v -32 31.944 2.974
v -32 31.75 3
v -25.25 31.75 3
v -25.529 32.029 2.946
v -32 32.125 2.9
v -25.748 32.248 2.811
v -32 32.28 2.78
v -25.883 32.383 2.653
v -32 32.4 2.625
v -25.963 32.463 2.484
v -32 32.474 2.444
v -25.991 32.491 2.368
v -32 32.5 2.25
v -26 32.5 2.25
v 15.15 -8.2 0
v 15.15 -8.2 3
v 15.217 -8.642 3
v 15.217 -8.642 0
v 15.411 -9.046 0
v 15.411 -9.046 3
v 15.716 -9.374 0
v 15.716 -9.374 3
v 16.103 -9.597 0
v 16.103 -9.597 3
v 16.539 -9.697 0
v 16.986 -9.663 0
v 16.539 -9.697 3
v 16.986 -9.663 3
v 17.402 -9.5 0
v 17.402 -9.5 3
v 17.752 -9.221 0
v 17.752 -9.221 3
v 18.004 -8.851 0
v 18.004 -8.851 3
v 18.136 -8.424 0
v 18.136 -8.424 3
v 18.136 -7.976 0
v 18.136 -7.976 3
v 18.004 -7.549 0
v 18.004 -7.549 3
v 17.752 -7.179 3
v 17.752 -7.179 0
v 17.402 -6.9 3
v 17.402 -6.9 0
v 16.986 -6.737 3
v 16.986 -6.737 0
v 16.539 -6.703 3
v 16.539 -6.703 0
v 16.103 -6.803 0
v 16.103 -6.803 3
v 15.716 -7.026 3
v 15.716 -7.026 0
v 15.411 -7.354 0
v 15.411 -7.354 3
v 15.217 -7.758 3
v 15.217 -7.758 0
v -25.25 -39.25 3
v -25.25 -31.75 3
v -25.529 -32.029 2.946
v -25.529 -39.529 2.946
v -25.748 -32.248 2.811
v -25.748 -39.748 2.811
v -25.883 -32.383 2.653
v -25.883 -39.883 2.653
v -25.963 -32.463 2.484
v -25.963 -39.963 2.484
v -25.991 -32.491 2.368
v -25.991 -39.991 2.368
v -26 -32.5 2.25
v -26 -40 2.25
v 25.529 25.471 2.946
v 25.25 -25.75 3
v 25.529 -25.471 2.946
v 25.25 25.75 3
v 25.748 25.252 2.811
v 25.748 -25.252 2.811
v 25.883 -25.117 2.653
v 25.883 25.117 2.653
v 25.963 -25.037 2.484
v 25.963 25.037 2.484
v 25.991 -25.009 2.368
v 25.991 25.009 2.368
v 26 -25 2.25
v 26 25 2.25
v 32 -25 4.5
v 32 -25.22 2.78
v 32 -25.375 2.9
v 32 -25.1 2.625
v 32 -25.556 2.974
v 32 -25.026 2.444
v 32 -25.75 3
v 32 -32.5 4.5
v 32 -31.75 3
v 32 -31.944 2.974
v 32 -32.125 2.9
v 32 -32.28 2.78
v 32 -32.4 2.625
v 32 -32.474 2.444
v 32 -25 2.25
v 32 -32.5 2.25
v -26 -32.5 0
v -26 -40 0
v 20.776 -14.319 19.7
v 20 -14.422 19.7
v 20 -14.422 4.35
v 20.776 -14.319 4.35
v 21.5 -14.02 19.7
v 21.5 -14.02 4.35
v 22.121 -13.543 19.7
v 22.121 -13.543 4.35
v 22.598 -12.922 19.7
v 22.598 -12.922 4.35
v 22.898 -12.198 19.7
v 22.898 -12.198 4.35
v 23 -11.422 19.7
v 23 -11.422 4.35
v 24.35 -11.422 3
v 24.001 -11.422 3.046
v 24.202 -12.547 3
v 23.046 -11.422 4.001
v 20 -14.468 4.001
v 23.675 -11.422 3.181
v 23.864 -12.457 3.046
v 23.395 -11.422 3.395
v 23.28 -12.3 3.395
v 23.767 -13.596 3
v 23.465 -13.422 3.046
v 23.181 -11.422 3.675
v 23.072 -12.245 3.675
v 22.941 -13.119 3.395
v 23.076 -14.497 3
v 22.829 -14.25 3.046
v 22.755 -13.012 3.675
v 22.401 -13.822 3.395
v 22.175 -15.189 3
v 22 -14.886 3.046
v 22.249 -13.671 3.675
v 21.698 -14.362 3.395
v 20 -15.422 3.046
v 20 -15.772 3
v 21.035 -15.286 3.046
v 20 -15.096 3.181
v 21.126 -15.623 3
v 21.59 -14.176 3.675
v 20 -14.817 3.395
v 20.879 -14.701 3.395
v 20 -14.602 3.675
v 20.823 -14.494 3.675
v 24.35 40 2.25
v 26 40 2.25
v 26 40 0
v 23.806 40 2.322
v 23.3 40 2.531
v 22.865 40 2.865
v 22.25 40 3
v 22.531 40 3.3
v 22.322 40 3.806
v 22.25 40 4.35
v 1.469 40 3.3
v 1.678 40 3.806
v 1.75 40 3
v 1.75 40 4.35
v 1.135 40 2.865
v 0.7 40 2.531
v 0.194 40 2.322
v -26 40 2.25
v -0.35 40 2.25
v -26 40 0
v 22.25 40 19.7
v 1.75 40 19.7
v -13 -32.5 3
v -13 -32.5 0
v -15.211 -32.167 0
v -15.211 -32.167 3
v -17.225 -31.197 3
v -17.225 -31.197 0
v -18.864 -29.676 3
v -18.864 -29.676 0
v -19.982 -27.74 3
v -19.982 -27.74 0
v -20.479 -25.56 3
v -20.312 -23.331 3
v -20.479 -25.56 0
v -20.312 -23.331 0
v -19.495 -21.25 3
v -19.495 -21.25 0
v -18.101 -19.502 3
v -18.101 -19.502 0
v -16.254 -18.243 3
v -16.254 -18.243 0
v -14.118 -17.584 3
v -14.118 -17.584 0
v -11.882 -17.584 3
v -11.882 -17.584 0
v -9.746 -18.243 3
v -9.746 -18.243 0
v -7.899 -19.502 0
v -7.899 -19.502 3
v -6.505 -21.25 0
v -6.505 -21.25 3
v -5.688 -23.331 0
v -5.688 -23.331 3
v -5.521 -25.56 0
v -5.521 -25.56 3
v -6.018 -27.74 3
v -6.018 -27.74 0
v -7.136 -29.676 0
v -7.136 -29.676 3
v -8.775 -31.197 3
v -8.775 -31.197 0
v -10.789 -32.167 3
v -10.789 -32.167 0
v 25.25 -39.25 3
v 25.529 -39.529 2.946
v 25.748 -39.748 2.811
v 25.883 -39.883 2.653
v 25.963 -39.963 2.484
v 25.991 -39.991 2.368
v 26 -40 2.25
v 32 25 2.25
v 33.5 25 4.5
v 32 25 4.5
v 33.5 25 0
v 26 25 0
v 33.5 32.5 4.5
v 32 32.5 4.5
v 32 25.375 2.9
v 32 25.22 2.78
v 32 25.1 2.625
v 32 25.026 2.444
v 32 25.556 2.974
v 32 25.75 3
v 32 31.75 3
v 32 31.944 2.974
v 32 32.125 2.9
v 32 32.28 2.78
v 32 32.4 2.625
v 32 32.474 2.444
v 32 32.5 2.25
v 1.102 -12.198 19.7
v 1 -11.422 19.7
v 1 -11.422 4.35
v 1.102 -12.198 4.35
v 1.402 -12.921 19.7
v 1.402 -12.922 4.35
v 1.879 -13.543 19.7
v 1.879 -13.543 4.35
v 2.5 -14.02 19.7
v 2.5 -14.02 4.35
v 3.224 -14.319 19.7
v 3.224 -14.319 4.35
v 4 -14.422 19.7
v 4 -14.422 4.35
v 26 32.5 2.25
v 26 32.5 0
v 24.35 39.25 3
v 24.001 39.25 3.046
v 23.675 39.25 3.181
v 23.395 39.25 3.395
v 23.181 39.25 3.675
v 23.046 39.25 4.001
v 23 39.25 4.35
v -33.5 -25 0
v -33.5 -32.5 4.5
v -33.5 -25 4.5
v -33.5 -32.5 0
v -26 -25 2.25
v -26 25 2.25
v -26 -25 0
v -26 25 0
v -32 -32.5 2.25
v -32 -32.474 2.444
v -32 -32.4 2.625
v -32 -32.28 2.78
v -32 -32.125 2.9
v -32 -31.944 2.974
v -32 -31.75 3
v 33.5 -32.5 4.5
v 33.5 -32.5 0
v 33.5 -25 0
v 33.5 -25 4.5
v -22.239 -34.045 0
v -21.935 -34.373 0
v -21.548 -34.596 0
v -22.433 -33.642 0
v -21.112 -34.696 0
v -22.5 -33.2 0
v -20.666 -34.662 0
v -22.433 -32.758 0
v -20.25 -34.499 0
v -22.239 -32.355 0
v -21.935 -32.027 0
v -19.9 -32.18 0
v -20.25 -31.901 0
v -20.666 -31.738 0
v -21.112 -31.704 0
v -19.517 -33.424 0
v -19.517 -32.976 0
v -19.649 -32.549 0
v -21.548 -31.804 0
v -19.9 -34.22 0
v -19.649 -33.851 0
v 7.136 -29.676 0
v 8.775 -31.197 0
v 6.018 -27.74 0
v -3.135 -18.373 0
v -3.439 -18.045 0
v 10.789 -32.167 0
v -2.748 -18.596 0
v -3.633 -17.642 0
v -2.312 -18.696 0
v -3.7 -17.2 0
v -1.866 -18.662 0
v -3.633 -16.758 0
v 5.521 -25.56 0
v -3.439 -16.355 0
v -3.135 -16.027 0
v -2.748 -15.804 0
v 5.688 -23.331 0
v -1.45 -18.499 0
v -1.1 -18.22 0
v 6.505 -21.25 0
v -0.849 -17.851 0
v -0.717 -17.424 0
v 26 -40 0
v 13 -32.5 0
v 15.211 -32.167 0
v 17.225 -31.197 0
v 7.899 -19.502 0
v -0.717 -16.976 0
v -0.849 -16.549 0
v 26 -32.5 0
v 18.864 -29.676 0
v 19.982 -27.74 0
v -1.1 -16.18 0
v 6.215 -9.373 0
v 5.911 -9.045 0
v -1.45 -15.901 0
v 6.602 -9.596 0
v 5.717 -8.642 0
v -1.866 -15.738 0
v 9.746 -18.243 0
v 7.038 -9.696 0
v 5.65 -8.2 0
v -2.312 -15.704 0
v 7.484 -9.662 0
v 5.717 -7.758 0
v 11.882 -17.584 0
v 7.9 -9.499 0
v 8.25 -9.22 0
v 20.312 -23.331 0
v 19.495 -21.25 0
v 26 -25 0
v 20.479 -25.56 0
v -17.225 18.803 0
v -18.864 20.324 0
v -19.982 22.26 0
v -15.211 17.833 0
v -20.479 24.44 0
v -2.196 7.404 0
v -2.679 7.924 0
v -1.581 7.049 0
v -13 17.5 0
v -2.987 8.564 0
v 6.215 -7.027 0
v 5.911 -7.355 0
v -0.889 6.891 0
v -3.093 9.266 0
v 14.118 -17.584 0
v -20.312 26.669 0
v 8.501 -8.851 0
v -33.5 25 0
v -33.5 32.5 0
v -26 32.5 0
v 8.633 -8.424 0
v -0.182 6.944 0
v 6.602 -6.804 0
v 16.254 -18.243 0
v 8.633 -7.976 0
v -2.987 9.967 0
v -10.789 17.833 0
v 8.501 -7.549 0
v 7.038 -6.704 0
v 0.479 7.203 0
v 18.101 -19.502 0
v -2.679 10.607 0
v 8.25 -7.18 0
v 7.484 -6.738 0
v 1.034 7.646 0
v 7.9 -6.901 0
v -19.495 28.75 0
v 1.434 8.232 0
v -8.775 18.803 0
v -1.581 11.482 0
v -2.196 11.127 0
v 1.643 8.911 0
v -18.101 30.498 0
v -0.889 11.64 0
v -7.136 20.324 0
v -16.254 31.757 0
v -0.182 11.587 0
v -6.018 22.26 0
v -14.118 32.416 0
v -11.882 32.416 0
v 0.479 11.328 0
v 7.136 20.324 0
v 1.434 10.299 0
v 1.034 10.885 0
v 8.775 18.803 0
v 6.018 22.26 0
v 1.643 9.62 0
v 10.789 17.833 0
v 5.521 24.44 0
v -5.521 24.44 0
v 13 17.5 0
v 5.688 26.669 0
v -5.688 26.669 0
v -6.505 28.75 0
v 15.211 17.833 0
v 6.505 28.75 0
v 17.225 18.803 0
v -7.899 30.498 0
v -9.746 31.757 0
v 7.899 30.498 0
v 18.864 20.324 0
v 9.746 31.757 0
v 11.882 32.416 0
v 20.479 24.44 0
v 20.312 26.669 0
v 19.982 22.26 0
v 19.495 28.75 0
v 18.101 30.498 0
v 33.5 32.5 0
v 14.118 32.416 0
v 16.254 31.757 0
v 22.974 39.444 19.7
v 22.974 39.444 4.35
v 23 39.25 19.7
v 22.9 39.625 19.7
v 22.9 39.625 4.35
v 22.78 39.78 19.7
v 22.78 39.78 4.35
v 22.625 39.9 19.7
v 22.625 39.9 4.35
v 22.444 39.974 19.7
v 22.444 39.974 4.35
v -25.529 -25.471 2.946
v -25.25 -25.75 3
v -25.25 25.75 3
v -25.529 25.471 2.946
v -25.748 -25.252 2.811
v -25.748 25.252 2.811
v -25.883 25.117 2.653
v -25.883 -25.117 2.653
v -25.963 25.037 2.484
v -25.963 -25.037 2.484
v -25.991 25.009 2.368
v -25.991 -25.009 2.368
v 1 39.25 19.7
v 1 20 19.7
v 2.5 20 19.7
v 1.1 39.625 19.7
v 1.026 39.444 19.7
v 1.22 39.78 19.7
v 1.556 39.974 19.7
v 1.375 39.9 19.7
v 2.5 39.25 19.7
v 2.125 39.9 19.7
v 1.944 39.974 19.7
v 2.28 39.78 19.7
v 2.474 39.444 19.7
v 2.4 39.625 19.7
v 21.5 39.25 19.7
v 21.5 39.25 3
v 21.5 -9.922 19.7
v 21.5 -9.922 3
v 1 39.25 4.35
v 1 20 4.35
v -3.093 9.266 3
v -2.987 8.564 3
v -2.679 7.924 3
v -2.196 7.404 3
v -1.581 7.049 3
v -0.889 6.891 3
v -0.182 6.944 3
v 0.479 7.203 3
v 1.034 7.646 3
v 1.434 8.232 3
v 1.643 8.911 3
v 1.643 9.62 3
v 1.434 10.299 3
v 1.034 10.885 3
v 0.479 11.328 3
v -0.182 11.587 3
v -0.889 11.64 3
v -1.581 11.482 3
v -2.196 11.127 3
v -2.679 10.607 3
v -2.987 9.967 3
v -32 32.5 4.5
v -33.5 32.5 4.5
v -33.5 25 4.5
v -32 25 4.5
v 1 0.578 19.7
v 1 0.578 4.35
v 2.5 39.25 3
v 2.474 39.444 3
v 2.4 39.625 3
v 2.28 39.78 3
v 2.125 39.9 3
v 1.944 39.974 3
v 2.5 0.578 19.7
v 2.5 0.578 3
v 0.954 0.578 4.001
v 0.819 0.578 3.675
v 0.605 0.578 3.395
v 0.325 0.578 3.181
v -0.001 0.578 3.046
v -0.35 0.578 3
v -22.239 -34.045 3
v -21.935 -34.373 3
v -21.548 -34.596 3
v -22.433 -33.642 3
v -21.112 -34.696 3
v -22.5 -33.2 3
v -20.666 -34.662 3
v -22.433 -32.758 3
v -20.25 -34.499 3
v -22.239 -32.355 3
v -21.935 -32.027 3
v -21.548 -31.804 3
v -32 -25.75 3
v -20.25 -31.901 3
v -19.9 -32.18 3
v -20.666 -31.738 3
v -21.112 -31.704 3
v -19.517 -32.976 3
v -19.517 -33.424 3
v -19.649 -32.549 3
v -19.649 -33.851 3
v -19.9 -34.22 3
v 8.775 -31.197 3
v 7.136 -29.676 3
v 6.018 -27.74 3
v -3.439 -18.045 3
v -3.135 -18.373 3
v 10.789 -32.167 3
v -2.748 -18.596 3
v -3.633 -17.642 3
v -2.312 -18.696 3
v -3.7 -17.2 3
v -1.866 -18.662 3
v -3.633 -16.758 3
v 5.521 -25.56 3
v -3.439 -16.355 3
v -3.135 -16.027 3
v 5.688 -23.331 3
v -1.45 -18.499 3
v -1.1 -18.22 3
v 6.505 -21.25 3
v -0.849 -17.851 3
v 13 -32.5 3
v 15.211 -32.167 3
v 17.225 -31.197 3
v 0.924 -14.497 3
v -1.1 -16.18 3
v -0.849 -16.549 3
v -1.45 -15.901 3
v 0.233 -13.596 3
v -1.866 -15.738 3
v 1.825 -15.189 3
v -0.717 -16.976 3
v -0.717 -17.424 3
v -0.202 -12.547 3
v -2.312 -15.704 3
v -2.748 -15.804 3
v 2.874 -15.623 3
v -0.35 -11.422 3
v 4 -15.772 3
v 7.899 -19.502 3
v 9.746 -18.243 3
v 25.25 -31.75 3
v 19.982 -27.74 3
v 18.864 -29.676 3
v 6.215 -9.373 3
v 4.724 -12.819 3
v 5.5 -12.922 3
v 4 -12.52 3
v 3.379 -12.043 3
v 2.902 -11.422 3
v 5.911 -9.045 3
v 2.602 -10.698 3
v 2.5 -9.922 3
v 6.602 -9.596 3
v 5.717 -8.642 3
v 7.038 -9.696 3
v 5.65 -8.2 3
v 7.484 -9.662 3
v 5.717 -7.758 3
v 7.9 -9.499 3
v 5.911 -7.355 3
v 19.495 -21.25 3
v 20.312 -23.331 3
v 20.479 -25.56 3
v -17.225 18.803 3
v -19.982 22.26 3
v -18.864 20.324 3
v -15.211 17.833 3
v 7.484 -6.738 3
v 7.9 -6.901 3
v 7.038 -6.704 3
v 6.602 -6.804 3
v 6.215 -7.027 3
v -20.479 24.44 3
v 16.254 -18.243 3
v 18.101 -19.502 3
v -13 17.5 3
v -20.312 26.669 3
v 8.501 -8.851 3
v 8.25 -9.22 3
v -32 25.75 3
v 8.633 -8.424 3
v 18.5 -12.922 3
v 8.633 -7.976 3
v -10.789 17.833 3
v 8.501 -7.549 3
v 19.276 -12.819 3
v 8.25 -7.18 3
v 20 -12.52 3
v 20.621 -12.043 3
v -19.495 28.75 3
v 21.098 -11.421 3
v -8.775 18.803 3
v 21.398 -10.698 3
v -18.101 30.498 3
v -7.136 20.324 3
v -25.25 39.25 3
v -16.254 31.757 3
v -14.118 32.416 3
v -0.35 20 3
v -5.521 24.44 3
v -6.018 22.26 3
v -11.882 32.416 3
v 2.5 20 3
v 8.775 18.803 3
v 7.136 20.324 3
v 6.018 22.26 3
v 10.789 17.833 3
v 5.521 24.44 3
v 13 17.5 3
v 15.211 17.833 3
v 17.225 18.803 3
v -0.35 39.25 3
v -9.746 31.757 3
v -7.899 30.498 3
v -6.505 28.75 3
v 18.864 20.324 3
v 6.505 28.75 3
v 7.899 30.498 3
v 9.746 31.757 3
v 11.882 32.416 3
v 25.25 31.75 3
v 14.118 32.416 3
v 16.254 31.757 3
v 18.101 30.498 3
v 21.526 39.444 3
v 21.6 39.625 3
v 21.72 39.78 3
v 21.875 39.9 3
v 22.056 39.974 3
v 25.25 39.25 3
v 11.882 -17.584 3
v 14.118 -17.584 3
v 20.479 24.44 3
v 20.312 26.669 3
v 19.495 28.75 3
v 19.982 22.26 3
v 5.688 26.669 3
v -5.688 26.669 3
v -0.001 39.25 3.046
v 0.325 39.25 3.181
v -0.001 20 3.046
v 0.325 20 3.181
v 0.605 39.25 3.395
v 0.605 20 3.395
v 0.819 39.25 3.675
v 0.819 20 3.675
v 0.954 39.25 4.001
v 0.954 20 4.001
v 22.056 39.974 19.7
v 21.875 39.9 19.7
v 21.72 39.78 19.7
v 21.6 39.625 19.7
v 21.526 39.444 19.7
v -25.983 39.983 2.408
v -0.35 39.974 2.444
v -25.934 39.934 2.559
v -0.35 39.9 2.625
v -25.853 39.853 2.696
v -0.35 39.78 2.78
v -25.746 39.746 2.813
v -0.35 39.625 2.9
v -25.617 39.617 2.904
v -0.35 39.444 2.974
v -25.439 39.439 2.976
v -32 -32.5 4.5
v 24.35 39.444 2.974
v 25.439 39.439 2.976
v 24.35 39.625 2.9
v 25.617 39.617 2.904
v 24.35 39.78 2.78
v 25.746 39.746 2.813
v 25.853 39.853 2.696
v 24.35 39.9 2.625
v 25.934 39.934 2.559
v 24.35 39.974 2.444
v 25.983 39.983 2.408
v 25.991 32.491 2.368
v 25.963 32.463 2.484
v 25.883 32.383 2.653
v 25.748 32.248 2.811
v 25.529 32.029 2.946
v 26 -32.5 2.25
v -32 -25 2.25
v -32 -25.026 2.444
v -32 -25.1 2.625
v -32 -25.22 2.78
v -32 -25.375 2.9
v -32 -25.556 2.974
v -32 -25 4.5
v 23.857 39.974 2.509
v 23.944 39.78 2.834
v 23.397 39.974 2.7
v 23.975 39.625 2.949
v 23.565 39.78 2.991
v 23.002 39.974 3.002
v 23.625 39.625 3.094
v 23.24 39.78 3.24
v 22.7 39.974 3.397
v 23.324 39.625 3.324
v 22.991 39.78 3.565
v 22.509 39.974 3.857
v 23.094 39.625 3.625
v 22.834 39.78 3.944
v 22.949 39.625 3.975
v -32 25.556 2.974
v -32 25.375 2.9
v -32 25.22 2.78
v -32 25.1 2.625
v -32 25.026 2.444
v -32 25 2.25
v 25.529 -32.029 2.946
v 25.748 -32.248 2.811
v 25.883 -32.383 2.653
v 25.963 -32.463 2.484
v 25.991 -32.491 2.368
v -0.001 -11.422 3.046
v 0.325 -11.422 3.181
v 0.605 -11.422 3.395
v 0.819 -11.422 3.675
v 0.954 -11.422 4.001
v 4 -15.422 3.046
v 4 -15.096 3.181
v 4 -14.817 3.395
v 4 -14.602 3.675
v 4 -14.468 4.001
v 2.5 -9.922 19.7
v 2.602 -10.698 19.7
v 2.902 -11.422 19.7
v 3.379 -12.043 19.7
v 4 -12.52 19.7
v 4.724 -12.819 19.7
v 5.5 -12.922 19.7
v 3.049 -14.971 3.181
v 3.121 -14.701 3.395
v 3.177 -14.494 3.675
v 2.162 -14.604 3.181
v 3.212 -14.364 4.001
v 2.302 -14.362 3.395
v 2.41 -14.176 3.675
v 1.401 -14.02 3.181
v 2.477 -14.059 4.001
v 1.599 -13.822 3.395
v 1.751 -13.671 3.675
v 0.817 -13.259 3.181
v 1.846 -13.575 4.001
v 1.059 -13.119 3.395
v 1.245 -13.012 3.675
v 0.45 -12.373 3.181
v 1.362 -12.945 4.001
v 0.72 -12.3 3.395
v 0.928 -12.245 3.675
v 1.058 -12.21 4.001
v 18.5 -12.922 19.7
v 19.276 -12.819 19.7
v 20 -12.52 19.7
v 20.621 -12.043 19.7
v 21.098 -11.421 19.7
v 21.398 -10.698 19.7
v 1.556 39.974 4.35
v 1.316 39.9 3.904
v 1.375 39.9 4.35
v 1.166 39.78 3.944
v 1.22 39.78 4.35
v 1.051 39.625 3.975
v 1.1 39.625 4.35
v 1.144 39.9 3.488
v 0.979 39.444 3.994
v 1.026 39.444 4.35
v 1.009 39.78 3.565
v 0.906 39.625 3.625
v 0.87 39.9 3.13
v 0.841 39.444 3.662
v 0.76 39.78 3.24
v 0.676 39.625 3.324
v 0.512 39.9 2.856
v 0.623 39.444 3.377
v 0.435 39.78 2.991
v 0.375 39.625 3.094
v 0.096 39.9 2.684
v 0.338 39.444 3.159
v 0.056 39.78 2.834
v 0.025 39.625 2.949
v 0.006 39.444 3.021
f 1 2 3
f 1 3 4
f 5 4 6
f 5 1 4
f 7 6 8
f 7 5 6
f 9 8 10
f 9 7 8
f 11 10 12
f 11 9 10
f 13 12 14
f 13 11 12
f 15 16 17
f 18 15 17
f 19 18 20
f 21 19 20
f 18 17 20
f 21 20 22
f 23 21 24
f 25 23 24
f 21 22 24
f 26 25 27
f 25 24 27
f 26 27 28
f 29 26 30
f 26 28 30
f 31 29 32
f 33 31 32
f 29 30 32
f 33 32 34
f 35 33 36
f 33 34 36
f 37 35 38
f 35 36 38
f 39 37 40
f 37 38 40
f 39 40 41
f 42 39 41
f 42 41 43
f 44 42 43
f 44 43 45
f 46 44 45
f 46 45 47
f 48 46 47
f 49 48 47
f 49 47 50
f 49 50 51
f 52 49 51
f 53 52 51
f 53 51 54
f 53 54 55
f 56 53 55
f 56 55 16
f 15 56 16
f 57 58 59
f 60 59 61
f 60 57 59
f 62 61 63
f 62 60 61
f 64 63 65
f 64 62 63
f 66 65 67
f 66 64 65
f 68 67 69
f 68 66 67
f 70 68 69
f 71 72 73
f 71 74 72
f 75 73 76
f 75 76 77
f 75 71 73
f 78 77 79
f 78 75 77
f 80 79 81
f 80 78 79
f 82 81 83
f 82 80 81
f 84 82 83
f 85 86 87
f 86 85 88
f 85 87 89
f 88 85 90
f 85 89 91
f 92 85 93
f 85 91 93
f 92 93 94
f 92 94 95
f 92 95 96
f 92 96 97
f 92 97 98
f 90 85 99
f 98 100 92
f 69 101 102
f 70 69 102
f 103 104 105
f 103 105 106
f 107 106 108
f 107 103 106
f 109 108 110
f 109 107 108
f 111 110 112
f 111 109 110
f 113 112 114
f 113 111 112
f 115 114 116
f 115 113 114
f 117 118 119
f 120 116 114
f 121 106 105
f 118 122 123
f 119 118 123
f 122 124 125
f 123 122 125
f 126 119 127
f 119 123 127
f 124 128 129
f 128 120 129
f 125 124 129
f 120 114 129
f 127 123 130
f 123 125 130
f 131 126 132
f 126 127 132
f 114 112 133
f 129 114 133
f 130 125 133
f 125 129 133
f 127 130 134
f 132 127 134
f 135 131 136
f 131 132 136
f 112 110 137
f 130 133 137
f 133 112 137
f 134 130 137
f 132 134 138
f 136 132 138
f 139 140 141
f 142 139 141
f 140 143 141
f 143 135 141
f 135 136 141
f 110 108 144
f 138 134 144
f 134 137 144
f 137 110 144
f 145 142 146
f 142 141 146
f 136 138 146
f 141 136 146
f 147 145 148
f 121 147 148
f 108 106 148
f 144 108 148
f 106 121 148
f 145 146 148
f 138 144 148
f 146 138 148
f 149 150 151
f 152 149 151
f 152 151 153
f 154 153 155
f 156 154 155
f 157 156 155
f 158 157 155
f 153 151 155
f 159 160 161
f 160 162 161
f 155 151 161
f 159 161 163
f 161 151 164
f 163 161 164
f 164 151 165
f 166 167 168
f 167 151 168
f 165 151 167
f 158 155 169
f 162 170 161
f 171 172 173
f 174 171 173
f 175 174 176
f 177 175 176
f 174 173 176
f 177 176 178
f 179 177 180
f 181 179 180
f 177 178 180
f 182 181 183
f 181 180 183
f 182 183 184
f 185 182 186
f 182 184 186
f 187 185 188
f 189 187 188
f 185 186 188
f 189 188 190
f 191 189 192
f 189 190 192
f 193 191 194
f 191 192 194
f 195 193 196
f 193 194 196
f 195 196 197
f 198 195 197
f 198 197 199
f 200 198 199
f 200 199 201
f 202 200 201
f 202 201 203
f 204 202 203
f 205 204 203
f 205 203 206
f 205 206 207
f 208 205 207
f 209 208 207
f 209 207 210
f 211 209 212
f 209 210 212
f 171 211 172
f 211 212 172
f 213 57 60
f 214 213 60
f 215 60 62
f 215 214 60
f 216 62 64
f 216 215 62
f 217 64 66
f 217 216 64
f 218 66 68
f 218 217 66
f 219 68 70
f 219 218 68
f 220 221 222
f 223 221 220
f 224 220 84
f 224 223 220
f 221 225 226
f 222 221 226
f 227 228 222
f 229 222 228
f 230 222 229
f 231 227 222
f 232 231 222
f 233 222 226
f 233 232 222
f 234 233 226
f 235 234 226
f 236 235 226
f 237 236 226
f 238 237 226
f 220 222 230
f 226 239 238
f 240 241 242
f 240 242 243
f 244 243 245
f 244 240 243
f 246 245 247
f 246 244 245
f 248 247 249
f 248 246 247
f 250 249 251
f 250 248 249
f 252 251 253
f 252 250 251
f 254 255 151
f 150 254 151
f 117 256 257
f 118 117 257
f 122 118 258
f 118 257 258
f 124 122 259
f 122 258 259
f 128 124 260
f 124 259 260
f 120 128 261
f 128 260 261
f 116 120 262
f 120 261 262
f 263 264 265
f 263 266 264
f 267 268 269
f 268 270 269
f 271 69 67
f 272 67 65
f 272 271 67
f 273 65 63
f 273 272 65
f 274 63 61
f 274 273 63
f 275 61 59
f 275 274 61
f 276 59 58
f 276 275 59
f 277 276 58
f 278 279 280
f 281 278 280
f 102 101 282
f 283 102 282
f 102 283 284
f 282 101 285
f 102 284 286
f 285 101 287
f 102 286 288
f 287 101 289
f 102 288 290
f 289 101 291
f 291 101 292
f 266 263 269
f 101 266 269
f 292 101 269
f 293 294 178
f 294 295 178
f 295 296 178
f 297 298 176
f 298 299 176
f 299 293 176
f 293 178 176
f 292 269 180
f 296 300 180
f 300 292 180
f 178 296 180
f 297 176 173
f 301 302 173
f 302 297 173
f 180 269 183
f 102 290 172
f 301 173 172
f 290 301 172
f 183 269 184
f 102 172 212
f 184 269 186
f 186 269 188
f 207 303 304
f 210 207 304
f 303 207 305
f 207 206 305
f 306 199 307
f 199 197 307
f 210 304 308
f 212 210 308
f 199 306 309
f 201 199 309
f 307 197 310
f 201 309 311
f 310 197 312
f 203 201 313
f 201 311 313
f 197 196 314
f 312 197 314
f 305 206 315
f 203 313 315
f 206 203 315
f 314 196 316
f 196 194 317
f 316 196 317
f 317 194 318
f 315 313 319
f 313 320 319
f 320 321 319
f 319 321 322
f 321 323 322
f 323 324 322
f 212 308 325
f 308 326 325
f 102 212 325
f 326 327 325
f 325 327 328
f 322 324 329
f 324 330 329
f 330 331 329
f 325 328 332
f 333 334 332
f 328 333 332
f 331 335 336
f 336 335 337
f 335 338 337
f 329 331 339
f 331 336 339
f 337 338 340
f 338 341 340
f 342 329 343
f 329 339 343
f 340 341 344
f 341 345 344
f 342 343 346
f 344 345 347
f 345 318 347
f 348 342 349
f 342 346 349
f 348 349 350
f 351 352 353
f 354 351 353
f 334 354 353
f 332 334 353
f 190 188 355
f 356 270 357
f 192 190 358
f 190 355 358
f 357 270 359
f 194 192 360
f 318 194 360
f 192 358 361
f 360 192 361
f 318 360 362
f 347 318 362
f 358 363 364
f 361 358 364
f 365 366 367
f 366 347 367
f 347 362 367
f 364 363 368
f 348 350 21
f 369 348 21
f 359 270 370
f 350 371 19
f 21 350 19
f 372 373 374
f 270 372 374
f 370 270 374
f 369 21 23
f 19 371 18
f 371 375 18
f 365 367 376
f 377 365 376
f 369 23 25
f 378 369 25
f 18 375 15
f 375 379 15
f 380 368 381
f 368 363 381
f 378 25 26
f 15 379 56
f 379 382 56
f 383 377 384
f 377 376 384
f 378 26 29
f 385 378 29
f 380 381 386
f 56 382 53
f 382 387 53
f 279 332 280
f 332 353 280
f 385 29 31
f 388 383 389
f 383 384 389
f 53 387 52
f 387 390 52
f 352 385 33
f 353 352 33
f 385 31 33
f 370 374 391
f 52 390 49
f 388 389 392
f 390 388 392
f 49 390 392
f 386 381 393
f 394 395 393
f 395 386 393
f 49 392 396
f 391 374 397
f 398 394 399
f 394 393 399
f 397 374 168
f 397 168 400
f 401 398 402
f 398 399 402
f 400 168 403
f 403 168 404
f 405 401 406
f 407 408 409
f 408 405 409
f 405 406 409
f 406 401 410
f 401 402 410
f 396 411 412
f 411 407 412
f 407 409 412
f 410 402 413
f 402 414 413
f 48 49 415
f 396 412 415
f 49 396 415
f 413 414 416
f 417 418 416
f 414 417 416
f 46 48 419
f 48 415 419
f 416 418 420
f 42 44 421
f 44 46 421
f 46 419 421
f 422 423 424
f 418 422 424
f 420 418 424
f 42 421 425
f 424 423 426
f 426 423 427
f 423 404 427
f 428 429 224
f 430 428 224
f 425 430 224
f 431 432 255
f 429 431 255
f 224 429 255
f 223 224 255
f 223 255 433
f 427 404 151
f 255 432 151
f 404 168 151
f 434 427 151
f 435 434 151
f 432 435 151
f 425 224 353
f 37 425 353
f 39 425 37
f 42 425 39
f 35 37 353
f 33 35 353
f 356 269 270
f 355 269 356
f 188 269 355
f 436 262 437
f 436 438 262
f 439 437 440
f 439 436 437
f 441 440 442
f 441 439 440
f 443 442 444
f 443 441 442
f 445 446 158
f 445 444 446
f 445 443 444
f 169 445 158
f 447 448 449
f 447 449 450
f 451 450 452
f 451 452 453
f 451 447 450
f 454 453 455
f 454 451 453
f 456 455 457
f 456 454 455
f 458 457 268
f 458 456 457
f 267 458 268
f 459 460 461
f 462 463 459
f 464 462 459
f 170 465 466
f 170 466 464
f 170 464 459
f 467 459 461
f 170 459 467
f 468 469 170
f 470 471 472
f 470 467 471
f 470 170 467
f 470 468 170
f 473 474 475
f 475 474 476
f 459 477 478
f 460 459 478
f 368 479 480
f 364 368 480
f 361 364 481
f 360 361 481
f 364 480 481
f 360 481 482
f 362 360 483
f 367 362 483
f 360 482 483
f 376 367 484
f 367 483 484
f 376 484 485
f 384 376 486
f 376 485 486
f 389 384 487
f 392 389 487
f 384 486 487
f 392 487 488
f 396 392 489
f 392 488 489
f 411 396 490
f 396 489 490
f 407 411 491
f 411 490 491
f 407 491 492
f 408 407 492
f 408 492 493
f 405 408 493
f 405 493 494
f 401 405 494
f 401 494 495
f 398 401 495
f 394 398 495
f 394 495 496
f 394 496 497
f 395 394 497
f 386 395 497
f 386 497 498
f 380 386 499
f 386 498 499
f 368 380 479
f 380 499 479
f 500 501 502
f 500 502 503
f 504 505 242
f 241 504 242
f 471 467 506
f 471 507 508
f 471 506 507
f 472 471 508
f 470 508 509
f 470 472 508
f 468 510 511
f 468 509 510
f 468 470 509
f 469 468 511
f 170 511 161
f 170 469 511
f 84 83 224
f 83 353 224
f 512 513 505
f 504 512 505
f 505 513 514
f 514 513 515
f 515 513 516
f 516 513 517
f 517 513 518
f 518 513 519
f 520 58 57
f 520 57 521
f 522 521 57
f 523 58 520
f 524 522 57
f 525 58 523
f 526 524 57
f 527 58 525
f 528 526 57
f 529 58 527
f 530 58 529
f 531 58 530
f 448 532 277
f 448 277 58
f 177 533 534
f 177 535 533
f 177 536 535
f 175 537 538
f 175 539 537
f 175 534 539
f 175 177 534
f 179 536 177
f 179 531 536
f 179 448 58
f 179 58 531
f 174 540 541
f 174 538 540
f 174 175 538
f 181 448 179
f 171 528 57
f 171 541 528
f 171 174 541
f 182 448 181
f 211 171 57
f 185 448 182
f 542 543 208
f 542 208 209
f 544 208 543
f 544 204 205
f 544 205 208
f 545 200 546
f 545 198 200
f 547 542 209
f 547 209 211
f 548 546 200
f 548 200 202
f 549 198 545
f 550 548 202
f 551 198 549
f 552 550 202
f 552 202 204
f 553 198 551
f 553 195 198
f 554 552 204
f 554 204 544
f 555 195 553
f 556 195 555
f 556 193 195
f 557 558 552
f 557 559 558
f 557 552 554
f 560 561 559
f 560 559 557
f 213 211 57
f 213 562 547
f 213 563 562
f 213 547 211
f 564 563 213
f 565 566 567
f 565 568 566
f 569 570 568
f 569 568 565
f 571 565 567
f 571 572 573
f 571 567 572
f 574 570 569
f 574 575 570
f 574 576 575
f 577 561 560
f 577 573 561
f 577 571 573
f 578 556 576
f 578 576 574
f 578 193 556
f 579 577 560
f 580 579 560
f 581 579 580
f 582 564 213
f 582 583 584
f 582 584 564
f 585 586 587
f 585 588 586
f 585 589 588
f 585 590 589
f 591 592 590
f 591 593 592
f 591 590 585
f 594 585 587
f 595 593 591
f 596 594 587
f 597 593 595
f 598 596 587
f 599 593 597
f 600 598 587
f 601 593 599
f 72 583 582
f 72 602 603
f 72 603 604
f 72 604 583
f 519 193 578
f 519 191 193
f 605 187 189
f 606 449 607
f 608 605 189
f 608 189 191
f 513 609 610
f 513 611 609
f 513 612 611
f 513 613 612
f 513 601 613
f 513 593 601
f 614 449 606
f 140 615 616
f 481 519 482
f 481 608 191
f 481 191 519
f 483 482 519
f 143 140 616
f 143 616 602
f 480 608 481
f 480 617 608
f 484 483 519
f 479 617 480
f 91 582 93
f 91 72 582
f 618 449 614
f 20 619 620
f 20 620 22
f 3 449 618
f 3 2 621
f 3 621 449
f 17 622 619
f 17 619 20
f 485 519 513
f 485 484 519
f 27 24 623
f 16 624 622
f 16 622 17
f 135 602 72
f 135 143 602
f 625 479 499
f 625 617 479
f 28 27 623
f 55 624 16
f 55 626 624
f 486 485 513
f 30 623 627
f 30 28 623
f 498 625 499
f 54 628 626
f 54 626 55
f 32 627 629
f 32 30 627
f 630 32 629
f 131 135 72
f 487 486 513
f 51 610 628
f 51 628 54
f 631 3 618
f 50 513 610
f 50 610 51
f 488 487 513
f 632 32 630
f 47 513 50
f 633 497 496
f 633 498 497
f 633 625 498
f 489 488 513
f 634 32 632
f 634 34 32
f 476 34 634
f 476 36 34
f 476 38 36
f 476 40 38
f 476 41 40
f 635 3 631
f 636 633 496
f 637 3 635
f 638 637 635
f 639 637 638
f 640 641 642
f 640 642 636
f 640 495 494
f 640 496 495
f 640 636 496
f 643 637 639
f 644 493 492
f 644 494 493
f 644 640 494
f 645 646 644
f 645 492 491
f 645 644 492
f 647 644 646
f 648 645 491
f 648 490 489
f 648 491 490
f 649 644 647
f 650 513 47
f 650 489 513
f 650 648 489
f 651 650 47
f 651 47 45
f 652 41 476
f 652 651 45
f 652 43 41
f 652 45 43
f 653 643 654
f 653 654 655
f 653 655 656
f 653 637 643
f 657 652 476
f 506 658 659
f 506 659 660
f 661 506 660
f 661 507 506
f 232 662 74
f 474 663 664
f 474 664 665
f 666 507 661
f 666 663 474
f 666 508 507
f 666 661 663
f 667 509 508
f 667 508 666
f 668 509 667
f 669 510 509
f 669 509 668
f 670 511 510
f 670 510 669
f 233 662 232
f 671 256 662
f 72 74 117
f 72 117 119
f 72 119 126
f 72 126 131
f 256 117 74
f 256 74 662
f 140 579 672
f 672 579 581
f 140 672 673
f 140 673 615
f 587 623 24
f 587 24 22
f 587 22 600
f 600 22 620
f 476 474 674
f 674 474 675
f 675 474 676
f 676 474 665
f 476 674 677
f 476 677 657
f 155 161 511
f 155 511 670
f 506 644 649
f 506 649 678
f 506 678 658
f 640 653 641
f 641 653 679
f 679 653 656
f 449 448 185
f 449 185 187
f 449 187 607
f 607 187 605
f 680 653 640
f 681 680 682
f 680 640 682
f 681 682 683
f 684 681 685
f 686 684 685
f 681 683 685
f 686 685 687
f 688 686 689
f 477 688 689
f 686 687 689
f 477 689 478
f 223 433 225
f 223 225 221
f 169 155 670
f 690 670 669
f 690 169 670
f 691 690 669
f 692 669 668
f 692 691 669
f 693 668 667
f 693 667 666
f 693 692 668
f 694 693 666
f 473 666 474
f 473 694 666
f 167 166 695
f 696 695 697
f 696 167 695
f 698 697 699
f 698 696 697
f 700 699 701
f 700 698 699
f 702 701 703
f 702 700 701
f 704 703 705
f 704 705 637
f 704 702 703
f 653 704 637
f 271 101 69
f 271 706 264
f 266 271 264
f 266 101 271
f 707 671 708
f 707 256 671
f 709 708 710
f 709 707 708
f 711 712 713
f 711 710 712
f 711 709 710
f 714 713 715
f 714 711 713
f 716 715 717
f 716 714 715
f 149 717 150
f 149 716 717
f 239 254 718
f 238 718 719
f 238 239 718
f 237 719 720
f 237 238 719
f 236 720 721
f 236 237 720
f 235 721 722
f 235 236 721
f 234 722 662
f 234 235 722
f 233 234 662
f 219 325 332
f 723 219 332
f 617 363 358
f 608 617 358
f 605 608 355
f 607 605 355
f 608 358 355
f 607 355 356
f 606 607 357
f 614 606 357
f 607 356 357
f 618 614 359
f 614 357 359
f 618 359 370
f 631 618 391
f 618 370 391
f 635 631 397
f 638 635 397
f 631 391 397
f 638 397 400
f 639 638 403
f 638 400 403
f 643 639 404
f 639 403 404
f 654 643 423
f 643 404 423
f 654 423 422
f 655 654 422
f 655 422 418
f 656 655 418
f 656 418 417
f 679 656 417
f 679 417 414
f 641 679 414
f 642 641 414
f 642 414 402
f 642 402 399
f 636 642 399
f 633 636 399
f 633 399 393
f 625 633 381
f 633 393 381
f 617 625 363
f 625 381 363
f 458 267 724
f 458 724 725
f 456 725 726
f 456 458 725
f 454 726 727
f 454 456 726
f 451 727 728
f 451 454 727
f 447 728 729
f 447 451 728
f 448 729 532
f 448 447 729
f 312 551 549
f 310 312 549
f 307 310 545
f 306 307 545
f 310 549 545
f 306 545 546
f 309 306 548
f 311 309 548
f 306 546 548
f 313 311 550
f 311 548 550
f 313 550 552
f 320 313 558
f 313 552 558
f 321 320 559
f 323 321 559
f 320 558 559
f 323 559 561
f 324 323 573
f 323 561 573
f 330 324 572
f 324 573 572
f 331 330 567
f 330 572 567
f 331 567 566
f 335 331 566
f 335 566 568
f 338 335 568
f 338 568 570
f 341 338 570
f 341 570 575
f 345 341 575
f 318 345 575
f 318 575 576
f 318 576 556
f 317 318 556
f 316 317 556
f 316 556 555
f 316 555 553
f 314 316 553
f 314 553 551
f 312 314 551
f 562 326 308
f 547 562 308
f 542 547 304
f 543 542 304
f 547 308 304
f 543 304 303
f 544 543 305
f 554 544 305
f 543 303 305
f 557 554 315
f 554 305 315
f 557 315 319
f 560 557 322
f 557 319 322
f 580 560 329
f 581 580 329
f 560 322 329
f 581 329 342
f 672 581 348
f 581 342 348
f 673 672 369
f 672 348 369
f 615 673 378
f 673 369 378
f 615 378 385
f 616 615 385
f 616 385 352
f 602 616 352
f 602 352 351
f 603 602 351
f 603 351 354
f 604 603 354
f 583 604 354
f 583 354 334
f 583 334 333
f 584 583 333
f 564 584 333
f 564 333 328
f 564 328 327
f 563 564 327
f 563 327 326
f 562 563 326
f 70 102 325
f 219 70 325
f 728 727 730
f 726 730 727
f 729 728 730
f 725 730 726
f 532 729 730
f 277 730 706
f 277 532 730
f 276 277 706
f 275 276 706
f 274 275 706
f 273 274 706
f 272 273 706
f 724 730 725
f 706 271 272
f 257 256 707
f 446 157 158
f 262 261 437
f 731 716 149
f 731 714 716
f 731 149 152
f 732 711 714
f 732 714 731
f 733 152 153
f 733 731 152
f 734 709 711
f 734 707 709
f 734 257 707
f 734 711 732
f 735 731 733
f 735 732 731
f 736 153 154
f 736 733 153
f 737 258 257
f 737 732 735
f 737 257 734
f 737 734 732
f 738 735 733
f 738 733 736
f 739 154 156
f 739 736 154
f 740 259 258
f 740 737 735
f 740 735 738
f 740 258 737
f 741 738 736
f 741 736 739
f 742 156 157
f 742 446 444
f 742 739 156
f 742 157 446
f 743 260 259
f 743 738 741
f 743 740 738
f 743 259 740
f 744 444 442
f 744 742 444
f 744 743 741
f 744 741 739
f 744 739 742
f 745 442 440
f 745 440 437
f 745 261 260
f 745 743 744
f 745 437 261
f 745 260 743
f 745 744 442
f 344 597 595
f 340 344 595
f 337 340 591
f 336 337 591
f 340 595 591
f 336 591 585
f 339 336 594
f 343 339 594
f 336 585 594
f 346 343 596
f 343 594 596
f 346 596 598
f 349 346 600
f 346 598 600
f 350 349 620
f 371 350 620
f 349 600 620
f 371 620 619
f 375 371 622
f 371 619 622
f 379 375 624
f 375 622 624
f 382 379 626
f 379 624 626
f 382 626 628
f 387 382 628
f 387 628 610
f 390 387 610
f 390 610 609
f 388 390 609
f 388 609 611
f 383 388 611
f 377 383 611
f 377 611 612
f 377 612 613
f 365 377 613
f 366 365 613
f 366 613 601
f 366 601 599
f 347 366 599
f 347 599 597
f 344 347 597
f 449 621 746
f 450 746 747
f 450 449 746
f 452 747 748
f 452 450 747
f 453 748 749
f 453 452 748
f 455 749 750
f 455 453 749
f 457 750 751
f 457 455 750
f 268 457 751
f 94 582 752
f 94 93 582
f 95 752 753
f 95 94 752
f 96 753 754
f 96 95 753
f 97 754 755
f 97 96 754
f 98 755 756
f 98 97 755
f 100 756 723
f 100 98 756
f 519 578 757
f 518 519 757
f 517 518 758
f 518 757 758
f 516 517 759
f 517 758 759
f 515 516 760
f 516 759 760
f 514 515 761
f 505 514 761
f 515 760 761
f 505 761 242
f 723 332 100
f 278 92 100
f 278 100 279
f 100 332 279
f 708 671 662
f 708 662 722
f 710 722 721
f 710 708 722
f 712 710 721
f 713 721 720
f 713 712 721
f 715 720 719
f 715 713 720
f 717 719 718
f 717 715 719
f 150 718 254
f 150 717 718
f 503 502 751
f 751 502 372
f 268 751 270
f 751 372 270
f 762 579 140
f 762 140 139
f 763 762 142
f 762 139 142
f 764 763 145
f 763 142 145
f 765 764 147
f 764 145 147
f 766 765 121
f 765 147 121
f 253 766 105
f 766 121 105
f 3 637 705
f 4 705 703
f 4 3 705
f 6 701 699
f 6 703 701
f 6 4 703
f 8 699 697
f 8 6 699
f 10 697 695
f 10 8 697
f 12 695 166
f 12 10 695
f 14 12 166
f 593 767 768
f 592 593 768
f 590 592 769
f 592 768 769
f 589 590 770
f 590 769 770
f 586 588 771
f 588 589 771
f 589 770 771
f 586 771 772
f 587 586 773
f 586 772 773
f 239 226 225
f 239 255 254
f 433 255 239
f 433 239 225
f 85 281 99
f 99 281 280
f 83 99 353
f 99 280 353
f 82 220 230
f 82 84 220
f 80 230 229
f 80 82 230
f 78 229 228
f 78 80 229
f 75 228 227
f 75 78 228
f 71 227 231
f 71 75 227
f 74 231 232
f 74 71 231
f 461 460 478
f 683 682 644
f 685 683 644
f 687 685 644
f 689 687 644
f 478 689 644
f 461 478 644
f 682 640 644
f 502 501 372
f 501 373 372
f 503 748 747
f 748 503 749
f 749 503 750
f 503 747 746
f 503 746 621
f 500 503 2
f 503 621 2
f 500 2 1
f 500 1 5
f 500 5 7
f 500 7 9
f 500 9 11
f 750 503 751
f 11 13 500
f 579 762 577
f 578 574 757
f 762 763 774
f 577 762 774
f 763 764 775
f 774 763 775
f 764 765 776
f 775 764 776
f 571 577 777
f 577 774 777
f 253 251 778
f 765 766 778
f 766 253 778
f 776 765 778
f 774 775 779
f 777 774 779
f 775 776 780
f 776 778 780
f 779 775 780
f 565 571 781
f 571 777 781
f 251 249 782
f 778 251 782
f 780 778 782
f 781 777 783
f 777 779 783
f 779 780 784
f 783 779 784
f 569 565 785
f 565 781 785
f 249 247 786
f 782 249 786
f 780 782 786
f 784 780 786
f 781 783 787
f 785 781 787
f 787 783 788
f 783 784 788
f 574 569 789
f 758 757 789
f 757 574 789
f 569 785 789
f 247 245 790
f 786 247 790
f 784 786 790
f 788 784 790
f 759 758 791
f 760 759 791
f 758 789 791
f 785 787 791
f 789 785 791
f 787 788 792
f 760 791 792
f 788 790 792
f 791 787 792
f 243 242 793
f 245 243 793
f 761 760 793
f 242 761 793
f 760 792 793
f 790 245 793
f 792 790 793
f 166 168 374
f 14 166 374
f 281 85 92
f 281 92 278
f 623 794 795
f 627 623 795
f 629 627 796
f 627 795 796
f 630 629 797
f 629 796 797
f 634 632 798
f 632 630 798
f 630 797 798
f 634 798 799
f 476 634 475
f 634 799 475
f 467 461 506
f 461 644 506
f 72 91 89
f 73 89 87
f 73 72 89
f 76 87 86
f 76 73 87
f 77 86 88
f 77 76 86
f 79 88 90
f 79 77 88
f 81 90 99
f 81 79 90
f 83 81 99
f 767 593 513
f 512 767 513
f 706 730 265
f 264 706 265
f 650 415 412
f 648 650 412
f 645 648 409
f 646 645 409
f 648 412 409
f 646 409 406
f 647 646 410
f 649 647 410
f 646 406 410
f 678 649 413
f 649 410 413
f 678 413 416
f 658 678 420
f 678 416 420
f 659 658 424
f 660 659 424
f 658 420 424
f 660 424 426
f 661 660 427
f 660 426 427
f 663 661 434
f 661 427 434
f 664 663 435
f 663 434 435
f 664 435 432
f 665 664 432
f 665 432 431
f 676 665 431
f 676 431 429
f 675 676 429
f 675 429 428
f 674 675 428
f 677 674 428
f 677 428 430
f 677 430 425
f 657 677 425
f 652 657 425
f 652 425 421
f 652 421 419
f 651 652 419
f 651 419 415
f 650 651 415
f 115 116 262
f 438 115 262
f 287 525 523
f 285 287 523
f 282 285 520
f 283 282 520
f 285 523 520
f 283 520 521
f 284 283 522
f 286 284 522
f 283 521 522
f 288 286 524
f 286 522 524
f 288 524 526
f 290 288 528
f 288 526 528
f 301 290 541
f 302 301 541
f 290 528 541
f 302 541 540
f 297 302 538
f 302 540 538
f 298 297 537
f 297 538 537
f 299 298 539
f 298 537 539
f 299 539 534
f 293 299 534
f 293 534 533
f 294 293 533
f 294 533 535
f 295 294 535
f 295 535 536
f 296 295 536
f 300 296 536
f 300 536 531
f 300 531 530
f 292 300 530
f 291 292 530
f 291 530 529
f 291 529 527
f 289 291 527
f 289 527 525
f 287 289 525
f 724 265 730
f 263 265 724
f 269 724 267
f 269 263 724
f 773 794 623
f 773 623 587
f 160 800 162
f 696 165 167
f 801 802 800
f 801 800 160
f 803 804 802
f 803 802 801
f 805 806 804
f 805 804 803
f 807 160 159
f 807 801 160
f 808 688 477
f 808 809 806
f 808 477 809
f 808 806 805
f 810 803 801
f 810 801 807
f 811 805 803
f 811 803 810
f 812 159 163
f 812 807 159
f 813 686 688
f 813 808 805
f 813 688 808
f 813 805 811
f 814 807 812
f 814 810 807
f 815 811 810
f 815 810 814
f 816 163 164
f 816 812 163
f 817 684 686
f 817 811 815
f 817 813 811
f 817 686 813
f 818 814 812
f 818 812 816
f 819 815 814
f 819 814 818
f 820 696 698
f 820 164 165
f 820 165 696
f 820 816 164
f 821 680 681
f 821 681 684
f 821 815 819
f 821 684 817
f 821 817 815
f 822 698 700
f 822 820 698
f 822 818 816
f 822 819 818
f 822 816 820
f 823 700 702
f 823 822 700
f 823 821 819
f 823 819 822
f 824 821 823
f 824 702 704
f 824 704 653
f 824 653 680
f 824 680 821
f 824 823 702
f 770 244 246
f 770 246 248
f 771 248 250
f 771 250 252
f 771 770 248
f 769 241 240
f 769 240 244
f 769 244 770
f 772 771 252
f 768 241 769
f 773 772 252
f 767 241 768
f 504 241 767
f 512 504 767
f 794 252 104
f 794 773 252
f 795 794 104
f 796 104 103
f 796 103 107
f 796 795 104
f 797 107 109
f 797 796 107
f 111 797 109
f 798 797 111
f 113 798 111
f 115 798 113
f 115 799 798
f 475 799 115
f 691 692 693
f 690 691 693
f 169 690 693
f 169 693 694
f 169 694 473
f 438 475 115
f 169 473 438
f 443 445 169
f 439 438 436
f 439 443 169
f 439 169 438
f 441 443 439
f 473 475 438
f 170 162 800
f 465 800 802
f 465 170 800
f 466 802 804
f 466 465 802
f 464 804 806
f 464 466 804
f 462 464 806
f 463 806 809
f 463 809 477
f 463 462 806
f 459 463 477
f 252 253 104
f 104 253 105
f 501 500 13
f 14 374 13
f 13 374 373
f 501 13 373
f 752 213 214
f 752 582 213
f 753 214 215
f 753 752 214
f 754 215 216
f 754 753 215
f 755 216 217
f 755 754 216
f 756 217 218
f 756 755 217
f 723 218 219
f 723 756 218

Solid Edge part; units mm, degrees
sketch "Sketch1" plane through (0, 0, 0) normal (0, 0, 1) x (1, 0, 0)
  line L0 (-26, -40) -> (26, -40)
  line L1 (26, -40) -> (26, 40)
  line L2 (26, 40) -> (-26, 40)
  line L3 (-26, 40) -> (-26, -40)
extrude "Protrusion1" add sketch "Sketch1" along normal blind 3
sketch "Sketch2" plane through (0, 0, 3) normal (0, 0, 1) x (-1, 0, 0)
  line L0 (-23, 14.4215) -> (-23, -40)
  line L1 (-23, -40) -> (-21.5, -40)
  line L2 (-21.5, -40) -> (-21.5, 12.9215)
  line L3 (-21.5, 12.9215) -> (-2.5, 12.9215)
  line L4 (-2.5, 12.9215) -> (-2.5, -0.5785)
  line L5 (-2.5, -0.5785) -> (-1, -0.5785)
  line L6 (-1, -0.5785) -> (-1, 14.4215)
  line L7 (-1, 14.4215) -> (-23, 14.4215)
  line L8 (-2.5, -40) -> (-1, -40)
  line L9 (-1, -40) -> (-1, -20)
  line L10 (-1, -20) -> (-2.5, -20)
  line L11 (-2.5, -20) -> (-2.5, -40)
  dimension "D1" = 3.0023
  dimension "D2" = 3
  dimension "D3" = 9.5016
  dimension "D4" = 8.2
  dimension "D5" = 7.15
  dimension "D6" = 19
  dimension "D7" = 1.5
  dimension "D8" = 54.4215
  dimension "D9" = 22
  dimension "D10" = 3
  dimension "D11" = 15
  dimension "D12" = 1.5
extrude "ExtrudedProtrusion_2" add sketch "Sketch2" along normal blind 16.7
sketch "Sketch3" plane through (0, 0, 3) normal (0, 0, 1) x (-1, 0, 0)
  circle A0 centre (-7.15, 8.2) radius 1.5
  circle A1 centre (-16.6516, 8.2) radius 1.5011
  dimension "D1" = 3.0023
  dimension "D2" = 3
  dimension "D3" = 9.5016
  dimension "D4" = 8.2
  dimension "D5" = 7.15
  dimension "D6" = 19
  dimension "D7" = 1.5
  dimension "D8" = 54.4215
  dimension "D9" = 22
  dimension "D10" = 3
  dimension "D11" = 15
  dimension "D12" = 1.5
extrude "Cutout1" cut sketch "Sketch3" against normal up to vertex (3 mm away)
sketch "Sketch4" plane through (0, 0, 3) normal (0, 0, 1) x (-1, 0, 0)
  circle A0 centre (2.2, 17.2) radius 1.5
  circle A1 centre (21, 33.2) radius 1.5
  dimension "D1" = 3
  dimension "D2" = 6.8
  dimension "D3" = 5
  dimension "D4" = 3
  dimension "D5" = 36.8
  dimension "D6" = 2.2
extrude "Cutout2" cut sketch "Sketch4" against normal up to vertex (3 mm away)
sketch "Sketch5" plane through (0, 0, 0) normal (0, 0, -1) x (-1, 0, 0)
  line L0 (33.5, 25) -> (26, 25)
  line L1 (26, 25) -> (26, 32.5)
  line L2 (26, 32.5) -> (33.5, 32.5)
  line L3 (33.5, 32.5) -> (33.5, 25)
  line L4 (33.5, -25) -> (26, -25)
  line L5 (26, -25) -> (26, -32.5)
  line L6 (26, -32.5) -> (33.5, -32.5)
  line L7 (33.5, -32.5) -> (33.5, -25)
  line L8 (-33.5, -25) -> (-26, -25)
  line L9 (-26, -25) -> (-26, -32.5)
  line L10 (-26, -32.5) -> (-33.5, -32.5)
  line L11 (-33.5, -32.5) -> (-33.5, -25)
  line L12 (-33.5, 25) -> (-26, 25)
  line L13 (-26, 25) -> (-26, 32.5)
  line L14 (-26, 32.5) -> (-33.5, 32.5)
  line L15 (-33.5, 32.5) -> (-33.5, 25)
  dimension "D1" = 7.5
  dimension "D2" = 7.5
  dimension "D3" = 7.5
  dimension "D4" = 7.5
  dimension "D5" = 7.5
  dimension "D6" = 7.5
extrude "Protrusion2" add sketch "Sketch5" against normal up to vertex (3 mm away)
sketch "Sketch6" plane through (0, 0, 3) normal (0, 0, 1) x (-1, 0, 0)
  line L0 (32, 25) -> (32, 32.5)
  line L1 (32, 32.5) -> (33.5, 32.5)
  line L2 (33.5, 32.5) -> (33.5, 25)
  line L3 (33.5, 25) -> (32, 25)
  line L4 (33.5, -32.5) -> (33.5, -25)
  line L5 (33.5, -25) -> (32, -25)
  line L6 (32, -25) -> (32, -32.5)
  line L7 (32, -32.5) -> (33.5, -32.5)
  line L8 (-32, -25) -> (-32, -32.5)
  line L9 (-32, -32.5) -> (-33.5, -32.5)
  line L10 (-33.5, -32.5) -> (-33.5, -25)
  line L11 (-33.5, -25) -> (-32, -25)
  line L12 (-33.5, 32.5) -> (-33.5, 25)
  line L13 (-33.5, 25) -> (-32, 25)
  line L14 (-32, 25) -> (-32, 32.5)
  line L15 (-32, 32.5) -> (-33.5, 32.5)
  dimension "D1" = 1.5
extrude "ExtrudedProtrusion_4" add sketch "Sketch6" along normal blind 1.5
sketch "Sketch7" plane through (0, 0, 0) normal (0, 0, -1) x (0, -1, 0)
  circle A0 centre (-25, 13) radius 7.5
  circle A1 centre (25, -13) radius 7.5
  circle A2 centre (-25, -13) radius 7.5
  circle A3 centre (25, 13) radius 7.5
  dimension "D1" = 15
  dimension "D2" = 15
  dimension "D3" = 13
  dimension "D4" = 15
  dimension "D5" = 13
  dimension "D6" = 15
extrude "Cutout3" cut sketch "Sketch7" against normal up to vertex (3 mm away)
fillet "Round_1" radius 3 4 edges at (1, -14.4215, 11.35) (2.5, -12.9215, 11.35) (21.5, -12.9215, 11.35) (23, -14.4215, 11.35)
fillet "Round_2" radius 1.35 6 edges at (1, -5.4215, 3) (1.8787, -13.5428, 3) (12, -14.4215, 3) (22.1213, -13.5428, 3) (23, 14.2893, 3) (1, 30, 3)
fillet "Round_3" radius 0.75 23 edges at (1, 40, 12.025) (0.6046, 40, 3.3954) (-13.175, 40, 3) (2.5, 40, 11.35) (-26, 0, 3) (-26, 36.25, 3) (-26, -36.25, 3) (0, -40, 3) (21.5, 40, 11.35) (23, 40, 12.025) (23.3954, 40, 3.3954) (25.175, 40, 3) (26, 36.25, 3) (26, 0, 3) (26, -36.25, 3) (-29, 32.5, 3) (-29, 25, 3) (-29, -25, 3) (-29, -32.5, 3) (29, 32.5, 3) (29, 25, 3) (29, -25, 3) (29, -32.5, 3)
sketch "Sketch8" plane through (0, 0.375, 3) normal (0, 0, 1) x (-1, 0, 0)
  circle A0 centre (0.7114, -8.8906) radius 2.3812
extrude "ExtrudedCutout_5" cut sketch "Sketch8" against normal blind 9.1795
properties material "ABS Plastic, medium impact"
